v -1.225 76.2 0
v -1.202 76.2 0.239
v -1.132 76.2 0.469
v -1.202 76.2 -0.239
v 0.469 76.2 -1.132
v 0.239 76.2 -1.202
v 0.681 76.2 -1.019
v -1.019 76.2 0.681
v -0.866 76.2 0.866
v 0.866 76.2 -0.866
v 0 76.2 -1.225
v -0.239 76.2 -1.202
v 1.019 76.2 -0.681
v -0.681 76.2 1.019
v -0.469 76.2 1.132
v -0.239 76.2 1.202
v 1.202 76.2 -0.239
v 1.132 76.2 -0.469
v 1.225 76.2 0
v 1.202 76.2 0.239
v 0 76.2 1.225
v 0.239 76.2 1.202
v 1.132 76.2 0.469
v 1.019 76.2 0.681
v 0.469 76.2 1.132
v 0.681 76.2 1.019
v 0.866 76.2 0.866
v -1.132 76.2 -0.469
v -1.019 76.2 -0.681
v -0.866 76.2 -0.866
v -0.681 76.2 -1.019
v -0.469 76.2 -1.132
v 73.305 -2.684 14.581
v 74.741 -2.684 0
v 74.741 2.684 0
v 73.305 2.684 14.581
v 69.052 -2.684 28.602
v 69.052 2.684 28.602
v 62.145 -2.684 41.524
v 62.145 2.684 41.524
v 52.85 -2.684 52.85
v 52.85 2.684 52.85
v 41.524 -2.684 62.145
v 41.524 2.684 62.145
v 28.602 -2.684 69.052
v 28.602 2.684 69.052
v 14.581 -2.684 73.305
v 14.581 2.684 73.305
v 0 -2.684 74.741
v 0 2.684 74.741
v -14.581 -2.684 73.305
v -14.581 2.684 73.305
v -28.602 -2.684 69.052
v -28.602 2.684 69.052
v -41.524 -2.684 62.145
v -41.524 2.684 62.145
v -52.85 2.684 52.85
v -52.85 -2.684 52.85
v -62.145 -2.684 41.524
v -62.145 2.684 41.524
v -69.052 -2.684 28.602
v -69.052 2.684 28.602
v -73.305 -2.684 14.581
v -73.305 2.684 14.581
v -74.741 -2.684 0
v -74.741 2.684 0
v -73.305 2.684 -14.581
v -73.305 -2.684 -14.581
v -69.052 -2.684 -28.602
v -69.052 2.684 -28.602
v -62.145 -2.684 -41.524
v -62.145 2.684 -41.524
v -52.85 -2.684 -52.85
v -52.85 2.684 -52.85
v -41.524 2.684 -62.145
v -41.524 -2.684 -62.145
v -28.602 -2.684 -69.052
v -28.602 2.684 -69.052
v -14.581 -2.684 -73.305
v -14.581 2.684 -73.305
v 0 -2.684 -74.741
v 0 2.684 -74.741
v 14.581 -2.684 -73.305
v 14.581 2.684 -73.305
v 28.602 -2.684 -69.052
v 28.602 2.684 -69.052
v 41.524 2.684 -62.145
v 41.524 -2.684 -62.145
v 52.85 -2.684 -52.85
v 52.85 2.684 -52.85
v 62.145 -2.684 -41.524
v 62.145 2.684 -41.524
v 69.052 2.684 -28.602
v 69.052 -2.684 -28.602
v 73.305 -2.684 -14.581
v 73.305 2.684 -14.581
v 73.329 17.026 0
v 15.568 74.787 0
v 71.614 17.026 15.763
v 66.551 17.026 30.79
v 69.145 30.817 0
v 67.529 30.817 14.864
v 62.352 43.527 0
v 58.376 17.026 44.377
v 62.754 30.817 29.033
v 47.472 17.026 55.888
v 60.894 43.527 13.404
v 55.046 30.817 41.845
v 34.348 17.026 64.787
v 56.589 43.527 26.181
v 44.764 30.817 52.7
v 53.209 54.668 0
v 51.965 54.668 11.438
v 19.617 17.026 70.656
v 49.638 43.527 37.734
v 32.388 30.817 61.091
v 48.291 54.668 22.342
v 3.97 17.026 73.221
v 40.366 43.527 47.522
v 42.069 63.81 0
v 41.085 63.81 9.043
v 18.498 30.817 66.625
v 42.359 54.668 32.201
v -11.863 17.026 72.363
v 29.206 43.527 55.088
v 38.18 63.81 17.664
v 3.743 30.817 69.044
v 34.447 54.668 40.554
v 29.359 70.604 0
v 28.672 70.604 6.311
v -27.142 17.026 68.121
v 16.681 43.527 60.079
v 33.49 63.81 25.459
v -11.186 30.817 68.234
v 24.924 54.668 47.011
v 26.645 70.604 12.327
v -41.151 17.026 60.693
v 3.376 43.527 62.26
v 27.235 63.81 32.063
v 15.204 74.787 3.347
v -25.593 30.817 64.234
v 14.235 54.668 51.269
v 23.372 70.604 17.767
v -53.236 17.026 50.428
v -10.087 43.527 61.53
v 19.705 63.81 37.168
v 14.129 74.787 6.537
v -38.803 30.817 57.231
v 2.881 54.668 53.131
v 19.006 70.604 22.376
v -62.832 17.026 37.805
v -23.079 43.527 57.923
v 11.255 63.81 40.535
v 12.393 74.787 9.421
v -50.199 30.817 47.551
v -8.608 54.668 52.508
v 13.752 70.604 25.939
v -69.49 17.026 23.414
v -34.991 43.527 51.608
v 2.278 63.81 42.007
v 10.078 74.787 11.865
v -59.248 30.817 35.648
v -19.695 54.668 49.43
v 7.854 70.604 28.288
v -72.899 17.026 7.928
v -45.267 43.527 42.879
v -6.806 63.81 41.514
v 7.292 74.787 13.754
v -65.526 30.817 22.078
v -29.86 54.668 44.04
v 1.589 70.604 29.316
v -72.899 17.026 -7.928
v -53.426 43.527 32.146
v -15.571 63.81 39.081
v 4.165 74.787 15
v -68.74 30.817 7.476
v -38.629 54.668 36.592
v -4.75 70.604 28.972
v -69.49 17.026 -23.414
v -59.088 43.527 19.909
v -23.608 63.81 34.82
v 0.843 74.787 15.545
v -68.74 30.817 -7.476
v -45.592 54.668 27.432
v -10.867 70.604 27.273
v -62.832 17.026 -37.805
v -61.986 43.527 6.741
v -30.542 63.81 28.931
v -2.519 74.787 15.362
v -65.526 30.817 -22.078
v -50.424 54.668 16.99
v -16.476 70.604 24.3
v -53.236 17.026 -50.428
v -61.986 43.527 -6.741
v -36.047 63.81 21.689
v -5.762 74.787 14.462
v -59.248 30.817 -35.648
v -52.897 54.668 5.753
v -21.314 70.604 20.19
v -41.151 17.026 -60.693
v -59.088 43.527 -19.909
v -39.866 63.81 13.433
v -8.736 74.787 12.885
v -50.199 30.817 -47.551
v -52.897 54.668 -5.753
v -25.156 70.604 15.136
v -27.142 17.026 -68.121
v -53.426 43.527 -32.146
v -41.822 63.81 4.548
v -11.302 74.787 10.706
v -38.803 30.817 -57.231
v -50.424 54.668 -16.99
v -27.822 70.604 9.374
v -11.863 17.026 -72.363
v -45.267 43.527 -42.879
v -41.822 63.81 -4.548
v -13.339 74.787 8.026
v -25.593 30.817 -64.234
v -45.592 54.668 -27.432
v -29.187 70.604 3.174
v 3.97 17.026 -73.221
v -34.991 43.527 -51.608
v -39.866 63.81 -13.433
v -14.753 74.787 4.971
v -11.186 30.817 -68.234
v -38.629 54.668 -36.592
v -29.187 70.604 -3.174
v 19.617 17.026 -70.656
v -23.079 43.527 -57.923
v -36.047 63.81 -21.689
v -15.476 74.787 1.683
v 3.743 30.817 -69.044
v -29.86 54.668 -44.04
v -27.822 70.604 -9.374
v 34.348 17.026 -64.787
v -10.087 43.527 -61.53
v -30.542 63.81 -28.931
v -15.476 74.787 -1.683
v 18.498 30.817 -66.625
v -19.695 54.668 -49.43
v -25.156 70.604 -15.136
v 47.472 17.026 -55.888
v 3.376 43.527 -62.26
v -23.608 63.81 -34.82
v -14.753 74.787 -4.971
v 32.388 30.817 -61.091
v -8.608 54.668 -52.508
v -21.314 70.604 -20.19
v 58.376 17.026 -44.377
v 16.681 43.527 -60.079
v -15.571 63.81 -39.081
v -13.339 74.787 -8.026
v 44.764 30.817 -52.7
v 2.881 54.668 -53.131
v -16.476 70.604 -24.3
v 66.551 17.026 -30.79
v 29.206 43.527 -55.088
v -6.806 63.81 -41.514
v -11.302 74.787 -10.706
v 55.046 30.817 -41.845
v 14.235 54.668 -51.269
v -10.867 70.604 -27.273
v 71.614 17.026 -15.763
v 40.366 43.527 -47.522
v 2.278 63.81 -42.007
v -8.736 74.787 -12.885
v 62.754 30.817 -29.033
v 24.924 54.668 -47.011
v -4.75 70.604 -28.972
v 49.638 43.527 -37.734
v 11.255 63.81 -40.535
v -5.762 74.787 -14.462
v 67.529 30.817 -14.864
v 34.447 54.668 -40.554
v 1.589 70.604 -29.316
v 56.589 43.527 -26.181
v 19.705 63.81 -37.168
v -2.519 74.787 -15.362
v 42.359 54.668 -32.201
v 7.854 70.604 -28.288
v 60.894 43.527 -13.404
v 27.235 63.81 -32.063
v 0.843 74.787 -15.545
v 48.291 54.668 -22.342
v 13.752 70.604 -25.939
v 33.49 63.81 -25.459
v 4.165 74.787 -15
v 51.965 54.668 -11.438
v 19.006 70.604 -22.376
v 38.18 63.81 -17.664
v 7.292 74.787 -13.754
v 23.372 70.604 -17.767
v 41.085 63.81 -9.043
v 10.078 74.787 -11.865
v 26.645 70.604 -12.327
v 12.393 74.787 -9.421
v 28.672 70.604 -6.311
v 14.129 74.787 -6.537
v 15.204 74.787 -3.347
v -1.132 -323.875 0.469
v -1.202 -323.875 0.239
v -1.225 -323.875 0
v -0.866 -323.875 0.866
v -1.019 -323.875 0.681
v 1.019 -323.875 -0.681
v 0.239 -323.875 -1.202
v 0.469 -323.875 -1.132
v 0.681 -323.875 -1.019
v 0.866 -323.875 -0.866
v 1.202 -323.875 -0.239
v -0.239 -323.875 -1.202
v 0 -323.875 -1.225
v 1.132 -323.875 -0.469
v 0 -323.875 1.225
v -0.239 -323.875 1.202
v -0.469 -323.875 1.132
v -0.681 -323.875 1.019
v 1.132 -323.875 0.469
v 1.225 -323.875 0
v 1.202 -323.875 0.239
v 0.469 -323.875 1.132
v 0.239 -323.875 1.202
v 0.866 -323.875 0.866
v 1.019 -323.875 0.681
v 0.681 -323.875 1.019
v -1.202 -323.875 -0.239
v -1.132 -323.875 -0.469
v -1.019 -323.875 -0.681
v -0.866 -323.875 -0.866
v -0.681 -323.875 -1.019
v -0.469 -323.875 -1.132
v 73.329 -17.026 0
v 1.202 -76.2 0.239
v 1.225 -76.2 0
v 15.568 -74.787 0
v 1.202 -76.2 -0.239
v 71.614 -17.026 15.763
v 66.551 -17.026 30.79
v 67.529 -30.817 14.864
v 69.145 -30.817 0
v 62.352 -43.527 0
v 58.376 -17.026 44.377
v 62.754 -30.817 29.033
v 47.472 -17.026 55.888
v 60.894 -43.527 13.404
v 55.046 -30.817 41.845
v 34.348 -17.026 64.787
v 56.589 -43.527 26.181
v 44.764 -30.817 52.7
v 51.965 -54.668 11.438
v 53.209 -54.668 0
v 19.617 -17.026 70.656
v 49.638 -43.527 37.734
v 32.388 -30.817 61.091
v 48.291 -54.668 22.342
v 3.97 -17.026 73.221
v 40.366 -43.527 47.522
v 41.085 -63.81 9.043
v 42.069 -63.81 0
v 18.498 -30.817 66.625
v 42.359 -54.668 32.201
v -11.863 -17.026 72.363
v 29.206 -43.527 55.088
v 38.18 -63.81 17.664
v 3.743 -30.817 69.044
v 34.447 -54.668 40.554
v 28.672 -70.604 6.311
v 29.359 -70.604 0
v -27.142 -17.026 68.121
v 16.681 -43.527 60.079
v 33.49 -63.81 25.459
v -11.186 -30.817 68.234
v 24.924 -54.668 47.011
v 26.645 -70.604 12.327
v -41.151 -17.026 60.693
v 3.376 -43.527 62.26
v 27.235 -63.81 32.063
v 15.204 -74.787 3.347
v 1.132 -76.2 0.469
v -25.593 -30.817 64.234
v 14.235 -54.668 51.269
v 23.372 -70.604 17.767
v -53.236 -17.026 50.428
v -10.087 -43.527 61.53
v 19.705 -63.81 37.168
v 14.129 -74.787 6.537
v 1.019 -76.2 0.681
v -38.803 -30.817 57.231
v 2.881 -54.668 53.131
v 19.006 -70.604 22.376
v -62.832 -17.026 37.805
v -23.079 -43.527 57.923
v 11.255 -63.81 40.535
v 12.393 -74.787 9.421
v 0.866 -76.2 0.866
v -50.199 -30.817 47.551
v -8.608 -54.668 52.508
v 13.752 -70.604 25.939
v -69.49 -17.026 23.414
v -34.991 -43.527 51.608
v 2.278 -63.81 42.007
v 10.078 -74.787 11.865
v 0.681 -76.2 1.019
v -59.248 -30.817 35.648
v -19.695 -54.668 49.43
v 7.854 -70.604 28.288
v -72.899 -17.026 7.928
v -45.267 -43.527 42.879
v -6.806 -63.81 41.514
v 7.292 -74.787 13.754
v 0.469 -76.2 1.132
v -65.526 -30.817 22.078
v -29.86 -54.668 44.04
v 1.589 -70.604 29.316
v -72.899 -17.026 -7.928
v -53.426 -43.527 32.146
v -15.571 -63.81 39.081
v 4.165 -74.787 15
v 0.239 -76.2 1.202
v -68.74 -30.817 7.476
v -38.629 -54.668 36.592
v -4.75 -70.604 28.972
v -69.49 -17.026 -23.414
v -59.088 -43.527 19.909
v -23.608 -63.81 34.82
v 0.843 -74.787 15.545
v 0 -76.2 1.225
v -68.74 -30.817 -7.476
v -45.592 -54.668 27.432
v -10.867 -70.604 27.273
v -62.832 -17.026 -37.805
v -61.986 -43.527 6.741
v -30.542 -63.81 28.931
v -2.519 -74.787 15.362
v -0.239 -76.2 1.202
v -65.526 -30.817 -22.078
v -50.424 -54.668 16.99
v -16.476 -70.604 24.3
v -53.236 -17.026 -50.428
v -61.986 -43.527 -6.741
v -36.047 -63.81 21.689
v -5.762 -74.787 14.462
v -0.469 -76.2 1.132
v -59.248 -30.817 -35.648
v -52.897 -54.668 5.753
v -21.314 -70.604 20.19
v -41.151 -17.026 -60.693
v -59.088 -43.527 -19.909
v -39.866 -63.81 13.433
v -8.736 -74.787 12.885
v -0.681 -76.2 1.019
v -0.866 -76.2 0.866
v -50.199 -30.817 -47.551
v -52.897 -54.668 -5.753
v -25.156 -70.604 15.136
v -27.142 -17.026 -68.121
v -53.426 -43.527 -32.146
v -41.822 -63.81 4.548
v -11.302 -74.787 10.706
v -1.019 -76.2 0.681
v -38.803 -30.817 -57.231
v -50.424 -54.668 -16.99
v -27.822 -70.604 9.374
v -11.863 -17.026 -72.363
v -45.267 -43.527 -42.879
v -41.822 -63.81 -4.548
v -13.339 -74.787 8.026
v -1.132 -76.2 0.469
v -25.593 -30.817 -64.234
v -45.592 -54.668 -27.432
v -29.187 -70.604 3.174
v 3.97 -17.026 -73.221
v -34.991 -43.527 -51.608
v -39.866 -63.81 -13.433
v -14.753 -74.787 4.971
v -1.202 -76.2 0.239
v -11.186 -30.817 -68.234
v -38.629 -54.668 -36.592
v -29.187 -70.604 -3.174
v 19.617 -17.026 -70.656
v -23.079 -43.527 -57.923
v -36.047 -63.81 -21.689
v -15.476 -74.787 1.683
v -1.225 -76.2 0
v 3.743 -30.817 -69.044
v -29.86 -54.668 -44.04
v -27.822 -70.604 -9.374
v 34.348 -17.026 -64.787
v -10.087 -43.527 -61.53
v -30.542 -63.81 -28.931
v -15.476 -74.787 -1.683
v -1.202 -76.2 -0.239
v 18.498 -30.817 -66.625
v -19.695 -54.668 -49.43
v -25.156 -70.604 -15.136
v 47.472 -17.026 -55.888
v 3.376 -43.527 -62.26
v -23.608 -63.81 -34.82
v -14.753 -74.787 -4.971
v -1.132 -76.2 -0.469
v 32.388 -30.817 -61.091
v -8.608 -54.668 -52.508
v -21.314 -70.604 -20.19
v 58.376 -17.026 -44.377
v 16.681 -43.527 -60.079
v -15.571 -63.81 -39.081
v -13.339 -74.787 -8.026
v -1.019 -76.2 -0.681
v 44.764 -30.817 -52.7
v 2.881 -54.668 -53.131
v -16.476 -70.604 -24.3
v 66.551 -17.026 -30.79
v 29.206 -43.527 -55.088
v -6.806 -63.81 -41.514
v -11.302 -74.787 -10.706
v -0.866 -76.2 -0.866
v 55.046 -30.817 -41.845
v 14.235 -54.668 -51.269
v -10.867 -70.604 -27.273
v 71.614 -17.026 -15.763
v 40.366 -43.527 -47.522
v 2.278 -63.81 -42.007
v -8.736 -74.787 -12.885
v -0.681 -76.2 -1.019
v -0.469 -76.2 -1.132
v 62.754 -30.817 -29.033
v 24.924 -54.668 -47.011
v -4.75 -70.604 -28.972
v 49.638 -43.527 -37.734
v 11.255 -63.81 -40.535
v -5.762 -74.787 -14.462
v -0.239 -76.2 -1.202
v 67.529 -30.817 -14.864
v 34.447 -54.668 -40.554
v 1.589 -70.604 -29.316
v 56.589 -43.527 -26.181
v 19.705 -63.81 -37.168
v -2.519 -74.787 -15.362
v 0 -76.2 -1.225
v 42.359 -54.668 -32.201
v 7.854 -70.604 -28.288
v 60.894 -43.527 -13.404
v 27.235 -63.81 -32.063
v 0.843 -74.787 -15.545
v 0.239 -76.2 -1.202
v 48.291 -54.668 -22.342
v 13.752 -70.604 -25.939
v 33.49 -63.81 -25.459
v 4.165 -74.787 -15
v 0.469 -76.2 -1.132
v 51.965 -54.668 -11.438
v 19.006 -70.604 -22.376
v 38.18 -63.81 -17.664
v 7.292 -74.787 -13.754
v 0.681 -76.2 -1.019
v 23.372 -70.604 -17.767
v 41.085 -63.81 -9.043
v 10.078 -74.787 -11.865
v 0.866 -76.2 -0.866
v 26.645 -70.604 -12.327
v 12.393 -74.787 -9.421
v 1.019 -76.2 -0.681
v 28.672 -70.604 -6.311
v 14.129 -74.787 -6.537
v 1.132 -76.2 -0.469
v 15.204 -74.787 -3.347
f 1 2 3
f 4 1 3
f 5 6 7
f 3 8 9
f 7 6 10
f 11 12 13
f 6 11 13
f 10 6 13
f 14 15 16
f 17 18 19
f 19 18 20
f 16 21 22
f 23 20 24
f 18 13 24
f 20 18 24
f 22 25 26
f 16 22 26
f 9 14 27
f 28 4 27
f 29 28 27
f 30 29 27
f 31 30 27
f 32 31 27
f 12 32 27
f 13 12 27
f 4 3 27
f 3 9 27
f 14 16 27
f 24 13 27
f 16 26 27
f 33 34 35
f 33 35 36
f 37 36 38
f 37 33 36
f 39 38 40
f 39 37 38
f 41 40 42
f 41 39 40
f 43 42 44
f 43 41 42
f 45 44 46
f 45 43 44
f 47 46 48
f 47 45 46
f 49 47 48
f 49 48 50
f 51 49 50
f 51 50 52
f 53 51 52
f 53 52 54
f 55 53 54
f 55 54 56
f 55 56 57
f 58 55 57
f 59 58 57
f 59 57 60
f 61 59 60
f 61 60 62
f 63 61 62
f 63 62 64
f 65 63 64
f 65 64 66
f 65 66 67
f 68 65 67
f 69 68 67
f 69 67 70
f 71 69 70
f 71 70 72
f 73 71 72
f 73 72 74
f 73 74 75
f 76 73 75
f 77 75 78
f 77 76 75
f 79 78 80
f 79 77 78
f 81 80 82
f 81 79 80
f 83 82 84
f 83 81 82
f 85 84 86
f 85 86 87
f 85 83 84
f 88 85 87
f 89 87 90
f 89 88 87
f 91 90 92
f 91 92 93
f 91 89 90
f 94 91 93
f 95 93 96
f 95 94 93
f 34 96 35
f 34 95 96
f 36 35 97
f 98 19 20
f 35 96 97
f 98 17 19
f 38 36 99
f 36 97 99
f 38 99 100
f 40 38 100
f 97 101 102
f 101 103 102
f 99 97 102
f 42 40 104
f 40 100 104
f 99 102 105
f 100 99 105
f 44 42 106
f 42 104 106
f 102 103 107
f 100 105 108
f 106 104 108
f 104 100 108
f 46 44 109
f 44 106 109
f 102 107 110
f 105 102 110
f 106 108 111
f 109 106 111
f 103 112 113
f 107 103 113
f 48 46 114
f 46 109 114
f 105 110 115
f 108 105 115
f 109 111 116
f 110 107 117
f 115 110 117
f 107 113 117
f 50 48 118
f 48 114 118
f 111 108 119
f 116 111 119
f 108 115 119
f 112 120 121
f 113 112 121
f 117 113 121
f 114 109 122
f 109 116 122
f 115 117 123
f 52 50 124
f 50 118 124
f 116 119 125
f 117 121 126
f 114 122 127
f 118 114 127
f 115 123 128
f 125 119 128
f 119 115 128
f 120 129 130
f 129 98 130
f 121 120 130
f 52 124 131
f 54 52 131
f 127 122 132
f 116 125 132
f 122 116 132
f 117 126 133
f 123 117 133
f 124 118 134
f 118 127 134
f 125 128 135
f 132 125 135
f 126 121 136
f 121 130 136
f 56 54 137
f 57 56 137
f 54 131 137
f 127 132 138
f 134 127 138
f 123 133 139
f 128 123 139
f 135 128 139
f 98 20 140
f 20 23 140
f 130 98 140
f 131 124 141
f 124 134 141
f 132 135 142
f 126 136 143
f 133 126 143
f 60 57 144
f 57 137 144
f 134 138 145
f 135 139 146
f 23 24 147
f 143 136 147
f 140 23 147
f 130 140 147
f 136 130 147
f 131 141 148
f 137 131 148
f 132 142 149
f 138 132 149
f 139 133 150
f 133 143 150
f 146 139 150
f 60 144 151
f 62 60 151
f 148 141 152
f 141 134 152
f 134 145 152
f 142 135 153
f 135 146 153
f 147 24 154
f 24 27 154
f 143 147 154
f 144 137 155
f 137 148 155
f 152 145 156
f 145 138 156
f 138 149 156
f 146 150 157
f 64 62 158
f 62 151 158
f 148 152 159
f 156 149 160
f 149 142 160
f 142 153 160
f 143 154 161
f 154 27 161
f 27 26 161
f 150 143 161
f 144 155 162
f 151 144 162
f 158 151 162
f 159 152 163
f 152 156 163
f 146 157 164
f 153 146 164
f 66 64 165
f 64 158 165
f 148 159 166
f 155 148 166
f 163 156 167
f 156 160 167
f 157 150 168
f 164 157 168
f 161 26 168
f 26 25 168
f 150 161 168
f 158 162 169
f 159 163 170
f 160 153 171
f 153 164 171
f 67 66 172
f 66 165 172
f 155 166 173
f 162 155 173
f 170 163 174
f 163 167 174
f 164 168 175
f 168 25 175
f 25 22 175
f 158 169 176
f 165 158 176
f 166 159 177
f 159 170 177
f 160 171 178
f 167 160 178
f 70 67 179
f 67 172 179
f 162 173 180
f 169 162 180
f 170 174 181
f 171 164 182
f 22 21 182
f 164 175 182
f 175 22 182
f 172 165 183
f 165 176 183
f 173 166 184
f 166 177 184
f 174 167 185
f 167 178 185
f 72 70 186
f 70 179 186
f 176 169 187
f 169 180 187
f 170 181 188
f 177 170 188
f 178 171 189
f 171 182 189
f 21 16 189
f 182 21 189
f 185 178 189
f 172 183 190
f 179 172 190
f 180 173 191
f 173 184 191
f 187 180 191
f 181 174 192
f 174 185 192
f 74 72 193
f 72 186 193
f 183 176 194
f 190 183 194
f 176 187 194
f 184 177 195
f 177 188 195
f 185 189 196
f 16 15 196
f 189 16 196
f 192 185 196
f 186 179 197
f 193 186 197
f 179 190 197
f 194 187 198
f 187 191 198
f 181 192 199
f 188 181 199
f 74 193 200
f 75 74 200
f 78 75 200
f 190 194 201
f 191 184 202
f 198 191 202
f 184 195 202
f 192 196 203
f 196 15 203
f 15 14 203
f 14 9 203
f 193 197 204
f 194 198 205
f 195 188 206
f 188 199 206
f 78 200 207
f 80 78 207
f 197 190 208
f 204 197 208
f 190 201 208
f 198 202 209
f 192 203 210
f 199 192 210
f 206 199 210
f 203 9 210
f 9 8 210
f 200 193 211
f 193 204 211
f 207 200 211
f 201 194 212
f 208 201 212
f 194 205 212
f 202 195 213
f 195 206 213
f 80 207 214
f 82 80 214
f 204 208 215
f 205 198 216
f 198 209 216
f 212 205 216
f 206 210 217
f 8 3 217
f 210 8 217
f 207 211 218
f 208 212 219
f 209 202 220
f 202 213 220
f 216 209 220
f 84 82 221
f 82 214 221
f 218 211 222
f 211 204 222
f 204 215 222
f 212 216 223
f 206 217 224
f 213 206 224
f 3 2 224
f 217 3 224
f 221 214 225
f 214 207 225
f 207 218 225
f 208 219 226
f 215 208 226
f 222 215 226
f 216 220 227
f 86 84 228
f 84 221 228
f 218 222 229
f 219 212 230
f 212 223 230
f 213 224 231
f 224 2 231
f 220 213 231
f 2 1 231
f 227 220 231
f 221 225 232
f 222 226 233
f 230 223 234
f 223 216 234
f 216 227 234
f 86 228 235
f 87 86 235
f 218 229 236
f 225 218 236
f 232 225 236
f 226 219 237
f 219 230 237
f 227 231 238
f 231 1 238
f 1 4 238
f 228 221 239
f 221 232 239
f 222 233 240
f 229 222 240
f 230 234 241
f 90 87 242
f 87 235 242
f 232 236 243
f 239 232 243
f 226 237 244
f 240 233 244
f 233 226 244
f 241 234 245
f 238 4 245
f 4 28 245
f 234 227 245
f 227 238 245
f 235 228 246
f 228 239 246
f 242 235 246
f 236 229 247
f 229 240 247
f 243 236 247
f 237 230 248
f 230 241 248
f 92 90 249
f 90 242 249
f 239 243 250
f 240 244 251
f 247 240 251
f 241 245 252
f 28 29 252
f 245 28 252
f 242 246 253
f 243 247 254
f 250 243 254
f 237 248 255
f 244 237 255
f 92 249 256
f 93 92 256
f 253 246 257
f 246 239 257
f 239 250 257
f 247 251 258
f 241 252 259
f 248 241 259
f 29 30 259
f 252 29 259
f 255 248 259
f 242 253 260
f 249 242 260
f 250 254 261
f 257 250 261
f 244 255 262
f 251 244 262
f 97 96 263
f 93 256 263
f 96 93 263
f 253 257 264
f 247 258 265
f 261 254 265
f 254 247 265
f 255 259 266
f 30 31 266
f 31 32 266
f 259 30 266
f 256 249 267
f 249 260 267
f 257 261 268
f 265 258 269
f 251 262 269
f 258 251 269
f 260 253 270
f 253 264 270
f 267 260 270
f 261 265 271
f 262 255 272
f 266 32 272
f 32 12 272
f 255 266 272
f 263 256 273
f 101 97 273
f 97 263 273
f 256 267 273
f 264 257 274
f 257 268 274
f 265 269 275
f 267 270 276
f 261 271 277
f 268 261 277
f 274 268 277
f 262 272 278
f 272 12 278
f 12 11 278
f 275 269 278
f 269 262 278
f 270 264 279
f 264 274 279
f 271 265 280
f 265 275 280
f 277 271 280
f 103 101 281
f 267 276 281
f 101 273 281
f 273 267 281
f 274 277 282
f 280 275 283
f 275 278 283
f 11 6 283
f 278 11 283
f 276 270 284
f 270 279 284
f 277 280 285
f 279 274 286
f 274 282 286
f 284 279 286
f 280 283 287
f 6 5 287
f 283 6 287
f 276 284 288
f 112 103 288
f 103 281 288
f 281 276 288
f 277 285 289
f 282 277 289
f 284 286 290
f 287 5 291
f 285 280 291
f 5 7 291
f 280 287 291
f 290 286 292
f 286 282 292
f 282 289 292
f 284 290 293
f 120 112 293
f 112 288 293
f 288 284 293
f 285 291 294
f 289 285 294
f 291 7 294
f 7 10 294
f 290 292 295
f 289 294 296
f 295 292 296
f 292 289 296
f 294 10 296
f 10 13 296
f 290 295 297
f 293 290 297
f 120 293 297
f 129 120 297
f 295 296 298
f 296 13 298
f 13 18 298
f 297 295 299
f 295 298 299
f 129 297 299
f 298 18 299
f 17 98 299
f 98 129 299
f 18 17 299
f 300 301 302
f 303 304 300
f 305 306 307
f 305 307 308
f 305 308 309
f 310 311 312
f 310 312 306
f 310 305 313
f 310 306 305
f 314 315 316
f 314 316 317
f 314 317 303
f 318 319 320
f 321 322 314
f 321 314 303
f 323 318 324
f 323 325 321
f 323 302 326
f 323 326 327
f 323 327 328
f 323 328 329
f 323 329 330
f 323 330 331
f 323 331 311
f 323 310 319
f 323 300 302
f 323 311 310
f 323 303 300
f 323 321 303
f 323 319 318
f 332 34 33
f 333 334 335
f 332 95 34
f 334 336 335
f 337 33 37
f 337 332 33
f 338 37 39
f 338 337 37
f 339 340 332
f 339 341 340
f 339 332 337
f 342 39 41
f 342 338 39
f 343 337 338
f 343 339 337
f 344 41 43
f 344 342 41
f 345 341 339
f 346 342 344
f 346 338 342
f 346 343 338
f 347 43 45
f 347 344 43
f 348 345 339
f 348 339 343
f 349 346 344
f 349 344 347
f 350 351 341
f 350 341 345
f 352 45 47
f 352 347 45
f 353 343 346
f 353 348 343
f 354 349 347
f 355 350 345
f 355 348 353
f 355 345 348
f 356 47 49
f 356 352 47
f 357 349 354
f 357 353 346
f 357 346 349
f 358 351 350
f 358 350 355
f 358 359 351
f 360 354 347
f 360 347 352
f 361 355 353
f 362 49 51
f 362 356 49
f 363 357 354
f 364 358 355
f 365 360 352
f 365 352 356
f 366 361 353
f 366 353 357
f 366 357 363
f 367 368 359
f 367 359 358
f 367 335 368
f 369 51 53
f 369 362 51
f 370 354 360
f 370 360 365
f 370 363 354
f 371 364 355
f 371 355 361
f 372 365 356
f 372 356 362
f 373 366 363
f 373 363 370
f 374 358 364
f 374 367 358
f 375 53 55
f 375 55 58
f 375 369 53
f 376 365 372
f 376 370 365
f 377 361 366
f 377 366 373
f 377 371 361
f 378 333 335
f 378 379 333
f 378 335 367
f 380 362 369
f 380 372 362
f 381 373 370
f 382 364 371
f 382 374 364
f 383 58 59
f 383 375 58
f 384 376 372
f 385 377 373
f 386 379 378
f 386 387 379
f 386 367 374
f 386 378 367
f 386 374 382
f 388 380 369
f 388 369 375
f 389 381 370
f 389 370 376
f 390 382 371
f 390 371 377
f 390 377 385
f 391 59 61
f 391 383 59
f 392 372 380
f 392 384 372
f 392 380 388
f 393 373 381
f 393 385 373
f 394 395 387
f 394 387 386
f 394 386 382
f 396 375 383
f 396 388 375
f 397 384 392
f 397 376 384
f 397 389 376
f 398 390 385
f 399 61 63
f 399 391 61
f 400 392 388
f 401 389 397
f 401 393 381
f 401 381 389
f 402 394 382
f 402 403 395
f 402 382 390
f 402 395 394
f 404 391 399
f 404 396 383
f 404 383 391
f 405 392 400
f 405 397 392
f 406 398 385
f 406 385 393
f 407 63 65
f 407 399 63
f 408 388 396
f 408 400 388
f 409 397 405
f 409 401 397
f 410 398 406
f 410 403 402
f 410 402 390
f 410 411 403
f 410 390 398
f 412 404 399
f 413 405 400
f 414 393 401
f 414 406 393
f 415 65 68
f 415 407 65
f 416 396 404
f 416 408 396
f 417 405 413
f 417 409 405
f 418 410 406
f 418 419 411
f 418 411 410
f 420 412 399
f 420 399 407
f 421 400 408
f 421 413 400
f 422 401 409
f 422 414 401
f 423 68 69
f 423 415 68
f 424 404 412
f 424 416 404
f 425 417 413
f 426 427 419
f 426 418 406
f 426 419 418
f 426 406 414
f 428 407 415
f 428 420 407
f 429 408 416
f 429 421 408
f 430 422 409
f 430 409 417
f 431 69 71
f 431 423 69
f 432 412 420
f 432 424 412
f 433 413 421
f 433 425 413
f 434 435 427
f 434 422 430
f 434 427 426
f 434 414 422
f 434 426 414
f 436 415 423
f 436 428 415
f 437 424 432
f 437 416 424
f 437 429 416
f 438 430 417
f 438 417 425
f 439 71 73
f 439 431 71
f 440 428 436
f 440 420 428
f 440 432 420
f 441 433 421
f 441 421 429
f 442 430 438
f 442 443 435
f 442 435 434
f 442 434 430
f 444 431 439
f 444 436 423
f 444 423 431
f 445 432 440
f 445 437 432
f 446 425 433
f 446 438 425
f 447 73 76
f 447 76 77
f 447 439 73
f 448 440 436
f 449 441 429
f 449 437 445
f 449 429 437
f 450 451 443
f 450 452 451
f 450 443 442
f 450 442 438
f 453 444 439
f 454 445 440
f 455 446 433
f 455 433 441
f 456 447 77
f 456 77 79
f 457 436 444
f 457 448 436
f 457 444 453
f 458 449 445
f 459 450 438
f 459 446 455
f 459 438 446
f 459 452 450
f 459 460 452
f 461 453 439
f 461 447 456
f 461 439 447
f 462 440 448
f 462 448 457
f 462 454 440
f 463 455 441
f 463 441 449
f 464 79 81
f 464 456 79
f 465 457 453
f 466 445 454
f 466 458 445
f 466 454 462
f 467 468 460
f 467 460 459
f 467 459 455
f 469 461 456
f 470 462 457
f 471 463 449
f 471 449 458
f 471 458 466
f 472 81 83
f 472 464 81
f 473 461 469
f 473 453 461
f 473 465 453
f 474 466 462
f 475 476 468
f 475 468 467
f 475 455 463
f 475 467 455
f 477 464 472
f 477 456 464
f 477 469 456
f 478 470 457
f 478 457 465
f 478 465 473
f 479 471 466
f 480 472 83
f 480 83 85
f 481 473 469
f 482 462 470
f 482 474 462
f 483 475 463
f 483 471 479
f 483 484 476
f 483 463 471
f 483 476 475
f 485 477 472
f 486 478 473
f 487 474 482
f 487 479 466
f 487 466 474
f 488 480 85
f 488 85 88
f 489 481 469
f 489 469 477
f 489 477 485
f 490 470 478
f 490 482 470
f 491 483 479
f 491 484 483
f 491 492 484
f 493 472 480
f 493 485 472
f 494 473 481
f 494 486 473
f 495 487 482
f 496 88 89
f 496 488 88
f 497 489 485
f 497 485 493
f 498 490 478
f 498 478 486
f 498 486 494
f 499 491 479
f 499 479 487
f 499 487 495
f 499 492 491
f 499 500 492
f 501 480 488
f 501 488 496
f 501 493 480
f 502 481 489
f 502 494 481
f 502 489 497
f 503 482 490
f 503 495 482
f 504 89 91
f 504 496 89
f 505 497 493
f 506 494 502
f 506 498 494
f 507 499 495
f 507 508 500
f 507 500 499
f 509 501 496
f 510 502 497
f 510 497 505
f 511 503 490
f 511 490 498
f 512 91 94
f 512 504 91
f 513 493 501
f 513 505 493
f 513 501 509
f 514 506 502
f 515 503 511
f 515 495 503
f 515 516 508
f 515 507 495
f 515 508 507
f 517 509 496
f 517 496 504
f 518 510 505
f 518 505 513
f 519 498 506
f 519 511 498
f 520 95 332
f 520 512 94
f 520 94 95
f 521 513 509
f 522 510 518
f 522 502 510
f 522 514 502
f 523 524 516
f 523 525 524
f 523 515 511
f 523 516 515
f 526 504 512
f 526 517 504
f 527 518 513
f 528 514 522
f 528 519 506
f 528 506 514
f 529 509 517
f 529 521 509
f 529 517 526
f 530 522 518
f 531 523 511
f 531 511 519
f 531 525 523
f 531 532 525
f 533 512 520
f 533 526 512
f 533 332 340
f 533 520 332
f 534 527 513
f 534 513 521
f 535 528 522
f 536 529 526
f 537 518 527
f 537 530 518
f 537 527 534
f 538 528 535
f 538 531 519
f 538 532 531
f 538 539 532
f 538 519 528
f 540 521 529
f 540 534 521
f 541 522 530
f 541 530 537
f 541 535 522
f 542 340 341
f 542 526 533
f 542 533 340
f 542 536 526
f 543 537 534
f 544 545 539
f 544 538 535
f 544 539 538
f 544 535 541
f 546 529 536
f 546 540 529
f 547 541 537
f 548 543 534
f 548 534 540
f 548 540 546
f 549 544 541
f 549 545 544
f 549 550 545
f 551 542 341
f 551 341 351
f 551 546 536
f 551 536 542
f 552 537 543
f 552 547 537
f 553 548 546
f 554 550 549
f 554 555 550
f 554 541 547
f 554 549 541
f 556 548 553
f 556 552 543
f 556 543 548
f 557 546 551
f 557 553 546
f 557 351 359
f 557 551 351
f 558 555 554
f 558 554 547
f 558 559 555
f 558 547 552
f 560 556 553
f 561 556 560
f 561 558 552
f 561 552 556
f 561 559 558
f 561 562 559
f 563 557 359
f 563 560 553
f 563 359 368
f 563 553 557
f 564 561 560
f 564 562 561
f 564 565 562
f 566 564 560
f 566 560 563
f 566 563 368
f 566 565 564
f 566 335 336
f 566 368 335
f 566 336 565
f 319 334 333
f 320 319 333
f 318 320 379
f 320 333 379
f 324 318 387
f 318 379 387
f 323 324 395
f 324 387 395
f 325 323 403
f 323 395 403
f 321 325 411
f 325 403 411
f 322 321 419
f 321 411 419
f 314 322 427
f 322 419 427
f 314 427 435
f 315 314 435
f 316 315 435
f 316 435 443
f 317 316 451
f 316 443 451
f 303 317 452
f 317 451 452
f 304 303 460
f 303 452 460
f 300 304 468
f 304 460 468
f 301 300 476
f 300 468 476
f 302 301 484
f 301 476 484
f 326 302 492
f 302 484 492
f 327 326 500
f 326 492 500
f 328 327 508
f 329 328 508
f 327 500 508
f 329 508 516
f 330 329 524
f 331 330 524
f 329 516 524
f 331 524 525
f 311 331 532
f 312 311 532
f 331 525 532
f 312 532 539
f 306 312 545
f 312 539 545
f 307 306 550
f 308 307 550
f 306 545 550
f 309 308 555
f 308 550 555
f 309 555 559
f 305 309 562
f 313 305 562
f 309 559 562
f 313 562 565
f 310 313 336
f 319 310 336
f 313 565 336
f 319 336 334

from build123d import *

# Parameters (mm, degrees)
F0_R      = 74.741234
F1_DEPTH  = 76.2
F2_R      = 73.515954
F1_FACE_R = 1.22528
F3_DEPTH  = 247.674868


with BuildPart() as f1:
    # F0 (on Front) → F1 (new body, symmetric)
    with BuildSketch(Plane.XZ):
        Circle(F0_R)
    extrude(amount=F1_DEPTH, both=True)

    # F2
    f2_edges = [f1.edges().sort_by_distance(p)[0] for p in [
        (-74.741234, 76.2, 0),
        (74.741234, 0, 0),
        (-74.741234, -76.2, 0),
    ]]
    fillet(f2_edges, radius=F2_R)

    # F1_face (on face) → F3 (join)
    with BuildSketch(Plane.XZ.offset(76.2)):
        Circle(F1_FACE_R)
    extrude(amount=F3_DEPTH)


solid = f1.part
